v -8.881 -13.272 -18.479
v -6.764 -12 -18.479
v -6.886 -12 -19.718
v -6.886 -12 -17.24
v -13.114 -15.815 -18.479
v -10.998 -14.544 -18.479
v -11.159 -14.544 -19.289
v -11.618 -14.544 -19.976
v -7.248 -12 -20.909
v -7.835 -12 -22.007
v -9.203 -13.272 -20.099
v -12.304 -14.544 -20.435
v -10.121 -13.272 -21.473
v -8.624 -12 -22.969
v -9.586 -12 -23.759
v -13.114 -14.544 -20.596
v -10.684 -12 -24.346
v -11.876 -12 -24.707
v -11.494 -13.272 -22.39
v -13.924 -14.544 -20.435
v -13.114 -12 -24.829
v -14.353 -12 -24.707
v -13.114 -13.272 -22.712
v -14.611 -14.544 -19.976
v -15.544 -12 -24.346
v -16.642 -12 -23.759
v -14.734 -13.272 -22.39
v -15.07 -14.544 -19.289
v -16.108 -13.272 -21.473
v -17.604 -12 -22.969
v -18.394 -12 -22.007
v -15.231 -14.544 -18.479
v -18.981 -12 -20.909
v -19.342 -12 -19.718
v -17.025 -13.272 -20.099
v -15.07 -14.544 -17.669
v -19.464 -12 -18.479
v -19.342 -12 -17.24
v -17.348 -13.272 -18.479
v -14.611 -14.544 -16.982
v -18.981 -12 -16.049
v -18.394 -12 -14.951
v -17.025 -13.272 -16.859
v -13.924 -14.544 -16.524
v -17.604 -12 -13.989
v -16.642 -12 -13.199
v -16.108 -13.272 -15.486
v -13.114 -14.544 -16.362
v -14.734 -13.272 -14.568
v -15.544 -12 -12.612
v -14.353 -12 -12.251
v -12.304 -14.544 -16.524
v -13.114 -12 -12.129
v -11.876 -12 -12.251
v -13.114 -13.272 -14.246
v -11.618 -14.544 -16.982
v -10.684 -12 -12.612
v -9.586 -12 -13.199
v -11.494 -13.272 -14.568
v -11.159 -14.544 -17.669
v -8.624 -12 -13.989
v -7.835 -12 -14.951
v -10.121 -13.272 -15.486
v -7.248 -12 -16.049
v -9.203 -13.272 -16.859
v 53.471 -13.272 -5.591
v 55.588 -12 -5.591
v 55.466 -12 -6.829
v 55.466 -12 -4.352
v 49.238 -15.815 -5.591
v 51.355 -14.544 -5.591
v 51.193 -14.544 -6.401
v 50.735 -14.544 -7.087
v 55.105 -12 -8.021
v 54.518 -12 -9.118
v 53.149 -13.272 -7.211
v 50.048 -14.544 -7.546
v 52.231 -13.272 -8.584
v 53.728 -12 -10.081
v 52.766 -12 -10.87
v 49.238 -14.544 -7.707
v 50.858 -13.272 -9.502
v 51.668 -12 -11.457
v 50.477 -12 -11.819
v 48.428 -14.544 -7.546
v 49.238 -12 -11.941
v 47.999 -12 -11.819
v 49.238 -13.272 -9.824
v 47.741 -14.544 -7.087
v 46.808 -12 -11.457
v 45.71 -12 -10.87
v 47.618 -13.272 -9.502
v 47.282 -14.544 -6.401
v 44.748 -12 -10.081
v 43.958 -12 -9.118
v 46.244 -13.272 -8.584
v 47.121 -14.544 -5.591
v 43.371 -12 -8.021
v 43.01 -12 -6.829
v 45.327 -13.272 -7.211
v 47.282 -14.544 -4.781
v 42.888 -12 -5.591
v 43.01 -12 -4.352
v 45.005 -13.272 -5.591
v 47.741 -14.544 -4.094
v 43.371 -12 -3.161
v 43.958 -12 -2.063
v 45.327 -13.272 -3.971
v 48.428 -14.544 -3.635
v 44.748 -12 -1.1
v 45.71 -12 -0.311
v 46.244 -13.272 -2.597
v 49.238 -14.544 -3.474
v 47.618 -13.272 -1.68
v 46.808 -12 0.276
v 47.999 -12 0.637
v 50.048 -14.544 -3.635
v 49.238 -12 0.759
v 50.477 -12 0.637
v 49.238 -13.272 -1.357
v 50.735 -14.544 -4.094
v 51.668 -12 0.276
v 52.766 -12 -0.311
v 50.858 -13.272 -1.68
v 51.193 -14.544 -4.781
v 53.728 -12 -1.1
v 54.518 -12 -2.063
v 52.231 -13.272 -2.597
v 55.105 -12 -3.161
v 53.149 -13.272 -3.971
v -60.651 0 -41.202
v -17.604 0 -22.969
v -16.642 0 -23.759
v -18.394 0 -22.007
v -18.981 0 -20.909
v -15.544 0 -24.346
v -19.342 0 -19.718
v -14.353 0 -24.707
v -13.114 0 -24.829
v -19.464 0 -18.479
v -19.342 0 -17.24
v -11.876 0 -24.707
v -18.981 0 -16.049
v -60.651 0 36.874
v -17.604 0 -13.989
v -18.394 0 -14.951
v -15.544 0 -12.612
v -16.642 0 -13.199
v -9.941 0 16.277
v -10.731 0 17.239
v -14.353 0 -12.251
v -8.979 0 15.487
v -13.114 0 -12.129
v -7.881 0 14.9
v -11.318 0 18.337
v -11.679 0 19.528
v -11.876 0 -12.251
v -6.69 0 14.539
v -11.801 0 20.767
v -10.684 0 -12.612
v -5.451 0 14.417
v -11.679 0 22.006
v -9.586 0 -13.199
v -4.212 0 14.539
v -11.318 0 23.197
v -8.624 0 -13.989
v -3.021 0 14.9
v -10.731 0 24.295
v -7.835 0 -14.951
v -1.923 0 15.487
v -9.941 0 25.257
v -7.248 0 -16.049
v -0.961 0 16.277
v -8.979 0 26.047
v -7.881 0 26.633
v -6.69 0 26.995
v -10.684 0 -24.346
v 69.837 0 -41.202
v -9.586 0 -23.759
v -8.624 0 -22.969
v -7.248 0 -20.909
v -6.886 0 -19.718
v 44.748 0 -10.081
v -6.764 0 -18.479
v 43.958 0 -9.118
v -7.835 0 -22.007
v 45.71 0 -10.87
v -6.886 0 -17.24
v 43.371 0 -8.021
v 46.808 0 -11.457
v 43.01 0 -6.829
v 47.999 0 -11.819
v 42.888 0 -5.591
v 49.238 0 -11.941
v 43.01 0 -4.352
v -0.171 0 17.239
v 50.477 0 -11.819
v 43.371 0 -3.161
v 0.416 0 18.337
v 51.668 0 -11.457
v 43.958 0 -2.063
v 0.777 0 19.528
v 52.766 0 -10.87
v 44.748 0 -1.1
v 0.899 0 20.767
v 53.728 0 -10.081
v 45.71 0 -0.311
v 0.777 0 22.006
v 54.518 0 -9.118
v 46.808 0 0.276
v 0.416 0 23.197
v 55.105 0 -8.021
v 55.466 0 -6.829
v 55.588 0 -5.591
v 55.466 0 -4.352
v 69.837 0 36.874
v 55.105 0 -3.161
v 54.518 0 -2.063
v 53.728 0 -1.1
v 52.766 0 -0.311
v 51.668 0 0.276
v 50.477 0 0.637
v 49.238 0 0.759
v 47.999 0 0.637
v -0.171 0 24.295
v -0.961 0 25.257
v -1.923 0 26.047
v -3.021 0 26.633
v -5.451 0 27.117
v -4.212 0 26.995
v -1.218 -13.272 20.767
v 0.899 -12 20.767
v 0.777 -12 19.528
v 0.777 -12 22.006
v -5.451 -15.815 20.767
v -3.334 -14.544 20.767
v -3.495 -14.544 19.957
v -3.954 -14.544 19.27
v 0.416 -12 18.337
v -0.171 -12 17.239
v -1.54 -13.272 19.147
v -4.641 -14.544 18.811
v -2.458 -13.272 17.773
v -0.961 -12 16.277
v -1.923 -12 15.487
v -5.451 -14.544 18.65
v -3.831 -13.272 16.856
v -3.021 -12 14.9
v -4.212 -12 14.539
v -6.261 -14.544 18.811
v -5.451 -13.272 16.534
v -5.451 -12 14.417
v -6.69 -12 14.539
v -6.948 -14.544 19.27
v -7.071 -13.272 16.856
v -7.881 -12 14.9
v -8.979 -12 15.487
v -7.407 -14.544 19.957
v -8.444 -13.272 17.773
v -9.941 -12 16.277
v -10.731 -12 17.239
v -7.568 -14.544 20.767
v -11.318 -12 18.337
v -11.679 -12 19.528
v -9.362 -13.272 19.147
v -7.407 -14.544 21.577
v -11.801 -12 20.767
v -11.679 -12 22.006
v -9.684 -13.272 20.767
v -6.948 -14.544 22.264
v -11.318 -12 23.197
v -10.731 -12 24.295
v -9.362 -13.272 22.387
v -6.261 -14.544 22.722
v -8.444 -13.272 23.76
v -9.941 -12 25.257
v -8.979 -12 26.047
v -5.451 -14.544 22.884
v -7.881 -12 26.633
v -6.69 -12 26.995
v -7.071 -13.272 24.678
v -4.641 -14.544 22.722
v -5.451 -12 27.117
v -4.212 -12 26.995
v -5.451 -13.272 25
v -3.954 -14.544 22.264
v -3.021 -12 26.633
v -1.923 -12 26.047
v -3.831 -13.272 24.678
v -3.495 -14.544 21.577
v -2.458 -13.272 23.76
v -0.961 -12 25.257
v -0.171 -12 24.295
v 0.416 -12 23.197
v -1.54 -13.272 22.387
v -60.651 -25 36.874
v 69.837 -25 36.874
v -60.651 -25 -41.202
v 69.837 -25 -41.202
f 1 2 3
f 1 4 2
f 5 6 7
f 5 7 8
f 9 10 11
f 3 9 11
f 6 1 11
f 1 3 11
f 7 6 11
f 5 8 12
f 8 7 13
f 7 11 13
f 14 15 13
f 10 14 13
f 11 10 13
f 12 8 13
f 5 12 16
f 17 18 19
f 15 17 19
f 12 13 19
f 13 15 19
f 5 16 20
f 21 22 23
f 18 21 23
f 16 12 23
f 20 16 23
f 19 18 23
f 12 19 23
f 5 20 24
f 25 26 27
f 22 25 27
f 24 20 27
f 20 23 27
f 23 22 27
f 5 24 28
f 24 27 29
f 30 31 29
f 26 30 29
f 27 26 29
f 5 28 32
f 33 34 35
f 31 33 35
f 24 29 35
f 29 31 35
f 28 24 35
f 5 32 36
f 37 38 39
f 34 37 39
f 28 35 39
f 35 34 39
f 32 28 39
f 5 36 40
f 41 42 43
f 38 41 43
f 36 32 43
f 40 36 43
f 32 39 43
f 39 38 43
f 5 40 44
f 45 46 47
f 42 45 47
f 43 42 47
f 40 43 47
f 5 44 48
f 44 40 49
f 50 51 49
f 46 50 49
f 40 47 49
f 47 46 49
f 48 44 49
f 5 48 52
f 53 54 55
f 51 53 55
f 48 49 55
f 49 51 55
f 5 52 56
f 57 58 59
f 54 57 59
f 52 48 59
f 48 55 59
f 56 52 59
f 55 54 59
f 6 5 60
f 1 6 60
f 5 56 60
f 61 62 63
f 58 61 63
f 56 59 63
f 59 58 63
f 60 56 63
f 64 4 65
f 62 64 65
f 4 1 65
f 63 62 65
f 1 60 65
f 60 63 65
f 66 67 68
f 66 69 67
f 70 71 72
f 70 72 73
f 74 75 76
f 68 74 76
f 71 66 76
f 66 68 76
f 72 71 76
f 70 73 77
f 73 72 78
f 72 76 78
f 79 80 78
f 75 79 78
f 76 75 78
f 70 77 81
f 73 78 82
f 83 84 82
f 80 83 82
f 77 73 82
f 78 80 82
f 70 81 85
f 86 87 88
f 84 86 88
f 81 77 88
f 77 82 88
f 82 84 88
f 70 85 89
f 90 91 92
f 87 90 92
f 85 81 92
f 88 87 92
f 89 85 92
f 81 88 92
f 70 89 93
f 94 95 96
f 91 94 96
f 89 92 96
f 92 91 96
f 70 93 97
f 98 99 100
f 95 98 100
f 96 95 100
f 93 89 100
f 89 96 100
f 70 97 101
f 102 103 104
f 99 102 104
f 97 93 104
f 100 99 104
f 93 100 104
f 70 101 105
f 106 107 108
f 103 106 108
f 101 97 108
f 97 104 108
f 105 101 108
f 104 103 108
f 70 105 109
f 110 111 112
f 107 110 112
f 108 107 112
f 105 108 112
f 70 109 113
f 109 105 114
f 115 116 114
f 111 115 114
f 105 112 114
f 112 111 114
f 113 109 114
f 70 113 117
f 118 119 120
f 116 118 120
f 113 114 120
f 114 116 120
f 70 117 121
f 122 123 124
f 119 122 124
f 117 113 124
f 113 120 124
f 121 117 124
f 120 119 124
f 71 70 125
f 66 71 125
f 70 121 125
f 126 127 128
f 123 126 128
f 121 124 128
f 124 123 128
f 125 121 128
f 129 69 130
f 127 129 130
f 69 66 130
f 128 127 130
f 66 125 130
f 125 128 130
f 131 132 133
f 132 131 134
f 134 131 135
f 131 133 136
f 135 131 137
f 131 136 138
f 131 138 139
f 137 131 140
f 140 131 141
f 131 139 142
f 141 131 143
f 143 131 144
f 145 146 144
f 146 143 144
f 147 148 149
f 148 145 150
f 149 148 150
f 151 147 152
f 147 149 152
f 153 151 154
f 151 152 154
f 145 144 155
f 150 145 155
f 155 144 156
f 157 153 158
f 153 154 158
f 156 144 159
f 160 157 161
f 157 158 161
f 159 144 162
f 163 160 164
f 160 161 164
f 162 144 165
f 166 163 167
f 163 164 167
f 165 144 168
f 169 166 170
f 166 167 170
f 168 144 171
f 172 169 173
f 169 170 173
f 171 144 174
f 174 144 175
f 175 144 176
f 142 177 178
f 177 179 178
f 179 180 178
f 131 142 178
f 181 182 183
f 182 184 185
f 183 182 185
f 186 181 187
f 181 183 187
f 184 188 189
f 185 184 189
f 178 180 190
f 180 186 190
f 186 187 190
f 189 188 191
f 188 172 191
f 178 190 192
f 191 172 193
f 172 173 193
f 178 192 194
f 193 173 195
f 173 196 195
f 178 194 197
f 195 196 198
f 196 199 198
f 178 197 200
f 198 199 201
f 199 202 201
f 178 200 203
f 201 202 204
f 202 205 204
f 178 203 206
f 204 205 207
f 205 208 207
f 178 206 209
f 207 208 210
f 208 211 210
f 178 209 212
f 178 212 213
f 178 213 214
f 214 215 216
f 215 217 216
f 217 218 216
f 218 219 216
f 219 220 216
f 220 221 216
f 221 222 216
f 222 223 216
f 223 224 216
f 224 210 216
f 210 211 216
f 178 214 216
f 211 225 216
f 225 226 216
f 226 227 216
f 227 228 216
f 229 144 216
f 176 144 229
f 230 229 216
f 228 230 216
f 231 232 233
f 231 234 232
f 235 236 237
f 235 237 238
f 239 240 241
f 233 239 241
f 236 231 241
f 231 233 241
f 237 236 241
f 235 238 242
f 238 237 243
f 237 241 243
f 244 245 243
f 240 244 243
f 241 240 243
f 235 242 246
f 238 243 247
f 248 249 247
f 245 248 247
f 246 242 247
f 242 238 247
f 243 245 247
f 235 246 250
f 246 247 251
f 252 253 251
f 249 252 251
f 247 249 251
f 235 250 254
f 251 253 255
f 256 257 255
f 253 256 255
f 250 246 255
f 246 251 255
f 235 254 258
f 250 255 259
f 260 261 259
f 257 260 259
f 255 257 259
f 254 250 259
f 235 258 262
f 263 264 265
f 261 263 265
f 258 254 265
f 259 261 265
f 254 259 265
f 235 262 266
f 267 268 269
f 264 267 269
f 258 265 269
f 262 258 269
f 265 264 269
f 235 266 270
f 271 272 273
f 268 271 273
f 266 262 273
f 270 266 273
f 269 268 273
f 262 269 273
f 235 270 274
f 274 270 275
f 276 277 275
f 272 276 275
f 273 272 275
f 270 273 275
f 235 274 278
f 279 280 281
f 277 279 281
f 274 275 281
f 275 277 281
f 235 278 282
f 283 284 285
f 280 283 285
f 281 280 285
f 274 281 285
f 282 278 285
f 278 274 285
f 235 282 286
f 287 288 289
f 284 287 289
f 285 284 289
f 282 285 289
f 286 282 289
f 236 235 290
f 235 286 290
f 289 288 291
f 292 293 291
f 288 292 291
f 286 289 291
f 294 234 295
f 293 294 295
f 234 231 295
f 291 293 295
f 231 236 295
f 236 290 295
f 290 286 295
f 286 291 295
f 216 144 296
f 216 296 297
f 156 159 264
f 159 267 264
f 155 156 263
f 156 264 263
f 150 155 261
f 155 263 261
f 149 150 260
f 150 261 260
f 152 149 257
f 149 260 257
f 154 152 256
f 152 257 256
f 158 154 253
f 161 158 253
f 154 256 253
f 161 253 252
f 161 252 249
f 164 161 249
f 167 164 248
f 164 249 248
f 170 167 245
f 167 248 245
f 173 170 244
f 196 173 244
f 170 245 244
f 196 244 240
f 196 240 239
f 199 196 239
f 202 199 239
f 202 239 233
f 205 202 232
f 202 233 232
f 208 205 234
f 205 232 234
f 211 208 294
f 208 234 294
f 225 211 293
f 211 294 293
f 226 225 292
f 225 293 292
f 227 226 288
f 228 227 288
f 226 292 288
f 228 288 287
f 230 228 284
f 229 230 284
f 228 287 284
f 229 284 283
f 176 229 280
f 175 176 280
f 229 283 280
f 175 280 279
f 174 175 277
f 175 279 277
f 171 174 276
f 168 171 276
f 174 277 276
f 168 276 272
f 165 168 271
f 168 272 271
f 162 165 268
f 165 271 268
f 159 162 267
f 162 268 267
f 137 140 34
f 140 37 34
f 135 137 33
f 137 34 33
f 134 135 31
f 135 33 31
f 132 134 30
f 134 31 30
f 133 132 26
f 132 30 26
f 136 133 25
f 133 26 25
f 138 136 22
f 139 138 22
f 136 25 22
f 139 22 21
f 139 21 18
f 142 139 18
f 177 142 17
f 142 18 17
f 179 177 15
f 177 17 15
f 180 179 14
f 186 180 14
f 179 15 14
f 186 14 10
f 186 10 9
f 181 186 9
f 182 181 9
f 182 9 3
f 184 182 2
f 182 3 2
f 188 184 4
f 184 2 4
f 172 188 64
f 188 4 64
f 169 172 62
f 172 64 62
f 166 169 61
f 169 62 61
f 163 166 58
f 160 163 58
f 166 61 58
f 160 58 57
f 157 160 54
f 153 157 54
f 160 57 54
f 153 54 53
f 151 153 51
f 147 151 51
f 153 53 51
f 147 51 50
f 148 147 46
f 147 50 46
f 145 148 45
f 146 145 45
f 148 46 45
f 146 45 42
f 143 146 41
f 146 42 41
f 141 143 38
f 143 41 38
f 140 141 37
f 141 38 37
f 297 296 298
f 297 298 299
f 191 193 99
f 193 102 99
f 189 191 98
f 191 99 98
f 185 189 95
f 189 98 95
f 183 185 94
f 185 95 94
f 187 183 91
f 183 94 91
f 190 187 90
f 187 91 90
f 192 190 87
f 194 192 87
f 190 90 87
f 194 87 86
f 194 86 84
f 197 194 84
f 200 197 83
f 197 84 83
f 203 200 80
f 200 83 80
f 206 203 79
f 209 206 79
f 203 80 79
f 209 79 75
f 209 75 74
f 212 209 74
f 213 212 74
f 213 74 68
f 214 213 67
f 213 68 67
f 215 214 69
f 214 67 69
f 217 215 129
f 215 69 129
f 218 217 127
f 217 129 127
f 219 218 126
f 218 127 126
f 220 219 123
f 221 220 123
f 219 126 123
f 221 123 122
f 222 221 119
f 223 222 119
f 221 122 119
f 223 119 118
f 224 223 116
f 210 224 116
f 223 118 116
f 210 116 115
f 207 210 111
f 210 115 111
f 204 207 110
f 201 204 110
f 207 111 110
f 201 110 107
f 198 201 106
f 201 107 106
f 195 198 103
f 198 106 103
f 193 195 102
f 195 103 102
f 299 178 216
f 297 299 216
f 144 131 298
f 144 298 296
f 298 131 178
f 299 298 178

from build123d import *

# Parameters (mm, degrees)
F0_W     = 130.488038063
F0_H     = 78.0766904354
F1_DEPTH = 25
F3_D     = 12.7
F3_DEPTH = 12
F3_TIP   = 3.8154649308


# Not quite as in the source:
# - a length typed as a fraction of an inch, garbled in the dataset ("3 / 203.2 mm" for 3/8 in), is restored


with BuildPart() as f1:
    # F0 (on Front) → F1 (new body)
    with BuildSketch(Plane.XZ):
        with Locations((4.5927464962, -2.1641068161)):
            Rectangle(F0_W, F0_H)
    extrude(amount=F1_DEPTH)

    # F3
    with Locations(Plane(origin=(0, 0, 0), x_dir=(1, 0, 0), z_dir=(0, 1, 0))):
        with Locations((-13.1143694744, 18.479084596), (-5.4509616457, -20.7668524235), (49.2379032075, 5.5906269699)):
            Hole(F3_D / 2, depth=F3_DEPTH)
            with Locations((0, 0, -(F3_DEPTH + F3_TIP / 2))):  # 118° drill point
                Cone(0, F3_D / 2, F3_TIP, mode=Mode.SUBTRACT)


solid = f1.part
